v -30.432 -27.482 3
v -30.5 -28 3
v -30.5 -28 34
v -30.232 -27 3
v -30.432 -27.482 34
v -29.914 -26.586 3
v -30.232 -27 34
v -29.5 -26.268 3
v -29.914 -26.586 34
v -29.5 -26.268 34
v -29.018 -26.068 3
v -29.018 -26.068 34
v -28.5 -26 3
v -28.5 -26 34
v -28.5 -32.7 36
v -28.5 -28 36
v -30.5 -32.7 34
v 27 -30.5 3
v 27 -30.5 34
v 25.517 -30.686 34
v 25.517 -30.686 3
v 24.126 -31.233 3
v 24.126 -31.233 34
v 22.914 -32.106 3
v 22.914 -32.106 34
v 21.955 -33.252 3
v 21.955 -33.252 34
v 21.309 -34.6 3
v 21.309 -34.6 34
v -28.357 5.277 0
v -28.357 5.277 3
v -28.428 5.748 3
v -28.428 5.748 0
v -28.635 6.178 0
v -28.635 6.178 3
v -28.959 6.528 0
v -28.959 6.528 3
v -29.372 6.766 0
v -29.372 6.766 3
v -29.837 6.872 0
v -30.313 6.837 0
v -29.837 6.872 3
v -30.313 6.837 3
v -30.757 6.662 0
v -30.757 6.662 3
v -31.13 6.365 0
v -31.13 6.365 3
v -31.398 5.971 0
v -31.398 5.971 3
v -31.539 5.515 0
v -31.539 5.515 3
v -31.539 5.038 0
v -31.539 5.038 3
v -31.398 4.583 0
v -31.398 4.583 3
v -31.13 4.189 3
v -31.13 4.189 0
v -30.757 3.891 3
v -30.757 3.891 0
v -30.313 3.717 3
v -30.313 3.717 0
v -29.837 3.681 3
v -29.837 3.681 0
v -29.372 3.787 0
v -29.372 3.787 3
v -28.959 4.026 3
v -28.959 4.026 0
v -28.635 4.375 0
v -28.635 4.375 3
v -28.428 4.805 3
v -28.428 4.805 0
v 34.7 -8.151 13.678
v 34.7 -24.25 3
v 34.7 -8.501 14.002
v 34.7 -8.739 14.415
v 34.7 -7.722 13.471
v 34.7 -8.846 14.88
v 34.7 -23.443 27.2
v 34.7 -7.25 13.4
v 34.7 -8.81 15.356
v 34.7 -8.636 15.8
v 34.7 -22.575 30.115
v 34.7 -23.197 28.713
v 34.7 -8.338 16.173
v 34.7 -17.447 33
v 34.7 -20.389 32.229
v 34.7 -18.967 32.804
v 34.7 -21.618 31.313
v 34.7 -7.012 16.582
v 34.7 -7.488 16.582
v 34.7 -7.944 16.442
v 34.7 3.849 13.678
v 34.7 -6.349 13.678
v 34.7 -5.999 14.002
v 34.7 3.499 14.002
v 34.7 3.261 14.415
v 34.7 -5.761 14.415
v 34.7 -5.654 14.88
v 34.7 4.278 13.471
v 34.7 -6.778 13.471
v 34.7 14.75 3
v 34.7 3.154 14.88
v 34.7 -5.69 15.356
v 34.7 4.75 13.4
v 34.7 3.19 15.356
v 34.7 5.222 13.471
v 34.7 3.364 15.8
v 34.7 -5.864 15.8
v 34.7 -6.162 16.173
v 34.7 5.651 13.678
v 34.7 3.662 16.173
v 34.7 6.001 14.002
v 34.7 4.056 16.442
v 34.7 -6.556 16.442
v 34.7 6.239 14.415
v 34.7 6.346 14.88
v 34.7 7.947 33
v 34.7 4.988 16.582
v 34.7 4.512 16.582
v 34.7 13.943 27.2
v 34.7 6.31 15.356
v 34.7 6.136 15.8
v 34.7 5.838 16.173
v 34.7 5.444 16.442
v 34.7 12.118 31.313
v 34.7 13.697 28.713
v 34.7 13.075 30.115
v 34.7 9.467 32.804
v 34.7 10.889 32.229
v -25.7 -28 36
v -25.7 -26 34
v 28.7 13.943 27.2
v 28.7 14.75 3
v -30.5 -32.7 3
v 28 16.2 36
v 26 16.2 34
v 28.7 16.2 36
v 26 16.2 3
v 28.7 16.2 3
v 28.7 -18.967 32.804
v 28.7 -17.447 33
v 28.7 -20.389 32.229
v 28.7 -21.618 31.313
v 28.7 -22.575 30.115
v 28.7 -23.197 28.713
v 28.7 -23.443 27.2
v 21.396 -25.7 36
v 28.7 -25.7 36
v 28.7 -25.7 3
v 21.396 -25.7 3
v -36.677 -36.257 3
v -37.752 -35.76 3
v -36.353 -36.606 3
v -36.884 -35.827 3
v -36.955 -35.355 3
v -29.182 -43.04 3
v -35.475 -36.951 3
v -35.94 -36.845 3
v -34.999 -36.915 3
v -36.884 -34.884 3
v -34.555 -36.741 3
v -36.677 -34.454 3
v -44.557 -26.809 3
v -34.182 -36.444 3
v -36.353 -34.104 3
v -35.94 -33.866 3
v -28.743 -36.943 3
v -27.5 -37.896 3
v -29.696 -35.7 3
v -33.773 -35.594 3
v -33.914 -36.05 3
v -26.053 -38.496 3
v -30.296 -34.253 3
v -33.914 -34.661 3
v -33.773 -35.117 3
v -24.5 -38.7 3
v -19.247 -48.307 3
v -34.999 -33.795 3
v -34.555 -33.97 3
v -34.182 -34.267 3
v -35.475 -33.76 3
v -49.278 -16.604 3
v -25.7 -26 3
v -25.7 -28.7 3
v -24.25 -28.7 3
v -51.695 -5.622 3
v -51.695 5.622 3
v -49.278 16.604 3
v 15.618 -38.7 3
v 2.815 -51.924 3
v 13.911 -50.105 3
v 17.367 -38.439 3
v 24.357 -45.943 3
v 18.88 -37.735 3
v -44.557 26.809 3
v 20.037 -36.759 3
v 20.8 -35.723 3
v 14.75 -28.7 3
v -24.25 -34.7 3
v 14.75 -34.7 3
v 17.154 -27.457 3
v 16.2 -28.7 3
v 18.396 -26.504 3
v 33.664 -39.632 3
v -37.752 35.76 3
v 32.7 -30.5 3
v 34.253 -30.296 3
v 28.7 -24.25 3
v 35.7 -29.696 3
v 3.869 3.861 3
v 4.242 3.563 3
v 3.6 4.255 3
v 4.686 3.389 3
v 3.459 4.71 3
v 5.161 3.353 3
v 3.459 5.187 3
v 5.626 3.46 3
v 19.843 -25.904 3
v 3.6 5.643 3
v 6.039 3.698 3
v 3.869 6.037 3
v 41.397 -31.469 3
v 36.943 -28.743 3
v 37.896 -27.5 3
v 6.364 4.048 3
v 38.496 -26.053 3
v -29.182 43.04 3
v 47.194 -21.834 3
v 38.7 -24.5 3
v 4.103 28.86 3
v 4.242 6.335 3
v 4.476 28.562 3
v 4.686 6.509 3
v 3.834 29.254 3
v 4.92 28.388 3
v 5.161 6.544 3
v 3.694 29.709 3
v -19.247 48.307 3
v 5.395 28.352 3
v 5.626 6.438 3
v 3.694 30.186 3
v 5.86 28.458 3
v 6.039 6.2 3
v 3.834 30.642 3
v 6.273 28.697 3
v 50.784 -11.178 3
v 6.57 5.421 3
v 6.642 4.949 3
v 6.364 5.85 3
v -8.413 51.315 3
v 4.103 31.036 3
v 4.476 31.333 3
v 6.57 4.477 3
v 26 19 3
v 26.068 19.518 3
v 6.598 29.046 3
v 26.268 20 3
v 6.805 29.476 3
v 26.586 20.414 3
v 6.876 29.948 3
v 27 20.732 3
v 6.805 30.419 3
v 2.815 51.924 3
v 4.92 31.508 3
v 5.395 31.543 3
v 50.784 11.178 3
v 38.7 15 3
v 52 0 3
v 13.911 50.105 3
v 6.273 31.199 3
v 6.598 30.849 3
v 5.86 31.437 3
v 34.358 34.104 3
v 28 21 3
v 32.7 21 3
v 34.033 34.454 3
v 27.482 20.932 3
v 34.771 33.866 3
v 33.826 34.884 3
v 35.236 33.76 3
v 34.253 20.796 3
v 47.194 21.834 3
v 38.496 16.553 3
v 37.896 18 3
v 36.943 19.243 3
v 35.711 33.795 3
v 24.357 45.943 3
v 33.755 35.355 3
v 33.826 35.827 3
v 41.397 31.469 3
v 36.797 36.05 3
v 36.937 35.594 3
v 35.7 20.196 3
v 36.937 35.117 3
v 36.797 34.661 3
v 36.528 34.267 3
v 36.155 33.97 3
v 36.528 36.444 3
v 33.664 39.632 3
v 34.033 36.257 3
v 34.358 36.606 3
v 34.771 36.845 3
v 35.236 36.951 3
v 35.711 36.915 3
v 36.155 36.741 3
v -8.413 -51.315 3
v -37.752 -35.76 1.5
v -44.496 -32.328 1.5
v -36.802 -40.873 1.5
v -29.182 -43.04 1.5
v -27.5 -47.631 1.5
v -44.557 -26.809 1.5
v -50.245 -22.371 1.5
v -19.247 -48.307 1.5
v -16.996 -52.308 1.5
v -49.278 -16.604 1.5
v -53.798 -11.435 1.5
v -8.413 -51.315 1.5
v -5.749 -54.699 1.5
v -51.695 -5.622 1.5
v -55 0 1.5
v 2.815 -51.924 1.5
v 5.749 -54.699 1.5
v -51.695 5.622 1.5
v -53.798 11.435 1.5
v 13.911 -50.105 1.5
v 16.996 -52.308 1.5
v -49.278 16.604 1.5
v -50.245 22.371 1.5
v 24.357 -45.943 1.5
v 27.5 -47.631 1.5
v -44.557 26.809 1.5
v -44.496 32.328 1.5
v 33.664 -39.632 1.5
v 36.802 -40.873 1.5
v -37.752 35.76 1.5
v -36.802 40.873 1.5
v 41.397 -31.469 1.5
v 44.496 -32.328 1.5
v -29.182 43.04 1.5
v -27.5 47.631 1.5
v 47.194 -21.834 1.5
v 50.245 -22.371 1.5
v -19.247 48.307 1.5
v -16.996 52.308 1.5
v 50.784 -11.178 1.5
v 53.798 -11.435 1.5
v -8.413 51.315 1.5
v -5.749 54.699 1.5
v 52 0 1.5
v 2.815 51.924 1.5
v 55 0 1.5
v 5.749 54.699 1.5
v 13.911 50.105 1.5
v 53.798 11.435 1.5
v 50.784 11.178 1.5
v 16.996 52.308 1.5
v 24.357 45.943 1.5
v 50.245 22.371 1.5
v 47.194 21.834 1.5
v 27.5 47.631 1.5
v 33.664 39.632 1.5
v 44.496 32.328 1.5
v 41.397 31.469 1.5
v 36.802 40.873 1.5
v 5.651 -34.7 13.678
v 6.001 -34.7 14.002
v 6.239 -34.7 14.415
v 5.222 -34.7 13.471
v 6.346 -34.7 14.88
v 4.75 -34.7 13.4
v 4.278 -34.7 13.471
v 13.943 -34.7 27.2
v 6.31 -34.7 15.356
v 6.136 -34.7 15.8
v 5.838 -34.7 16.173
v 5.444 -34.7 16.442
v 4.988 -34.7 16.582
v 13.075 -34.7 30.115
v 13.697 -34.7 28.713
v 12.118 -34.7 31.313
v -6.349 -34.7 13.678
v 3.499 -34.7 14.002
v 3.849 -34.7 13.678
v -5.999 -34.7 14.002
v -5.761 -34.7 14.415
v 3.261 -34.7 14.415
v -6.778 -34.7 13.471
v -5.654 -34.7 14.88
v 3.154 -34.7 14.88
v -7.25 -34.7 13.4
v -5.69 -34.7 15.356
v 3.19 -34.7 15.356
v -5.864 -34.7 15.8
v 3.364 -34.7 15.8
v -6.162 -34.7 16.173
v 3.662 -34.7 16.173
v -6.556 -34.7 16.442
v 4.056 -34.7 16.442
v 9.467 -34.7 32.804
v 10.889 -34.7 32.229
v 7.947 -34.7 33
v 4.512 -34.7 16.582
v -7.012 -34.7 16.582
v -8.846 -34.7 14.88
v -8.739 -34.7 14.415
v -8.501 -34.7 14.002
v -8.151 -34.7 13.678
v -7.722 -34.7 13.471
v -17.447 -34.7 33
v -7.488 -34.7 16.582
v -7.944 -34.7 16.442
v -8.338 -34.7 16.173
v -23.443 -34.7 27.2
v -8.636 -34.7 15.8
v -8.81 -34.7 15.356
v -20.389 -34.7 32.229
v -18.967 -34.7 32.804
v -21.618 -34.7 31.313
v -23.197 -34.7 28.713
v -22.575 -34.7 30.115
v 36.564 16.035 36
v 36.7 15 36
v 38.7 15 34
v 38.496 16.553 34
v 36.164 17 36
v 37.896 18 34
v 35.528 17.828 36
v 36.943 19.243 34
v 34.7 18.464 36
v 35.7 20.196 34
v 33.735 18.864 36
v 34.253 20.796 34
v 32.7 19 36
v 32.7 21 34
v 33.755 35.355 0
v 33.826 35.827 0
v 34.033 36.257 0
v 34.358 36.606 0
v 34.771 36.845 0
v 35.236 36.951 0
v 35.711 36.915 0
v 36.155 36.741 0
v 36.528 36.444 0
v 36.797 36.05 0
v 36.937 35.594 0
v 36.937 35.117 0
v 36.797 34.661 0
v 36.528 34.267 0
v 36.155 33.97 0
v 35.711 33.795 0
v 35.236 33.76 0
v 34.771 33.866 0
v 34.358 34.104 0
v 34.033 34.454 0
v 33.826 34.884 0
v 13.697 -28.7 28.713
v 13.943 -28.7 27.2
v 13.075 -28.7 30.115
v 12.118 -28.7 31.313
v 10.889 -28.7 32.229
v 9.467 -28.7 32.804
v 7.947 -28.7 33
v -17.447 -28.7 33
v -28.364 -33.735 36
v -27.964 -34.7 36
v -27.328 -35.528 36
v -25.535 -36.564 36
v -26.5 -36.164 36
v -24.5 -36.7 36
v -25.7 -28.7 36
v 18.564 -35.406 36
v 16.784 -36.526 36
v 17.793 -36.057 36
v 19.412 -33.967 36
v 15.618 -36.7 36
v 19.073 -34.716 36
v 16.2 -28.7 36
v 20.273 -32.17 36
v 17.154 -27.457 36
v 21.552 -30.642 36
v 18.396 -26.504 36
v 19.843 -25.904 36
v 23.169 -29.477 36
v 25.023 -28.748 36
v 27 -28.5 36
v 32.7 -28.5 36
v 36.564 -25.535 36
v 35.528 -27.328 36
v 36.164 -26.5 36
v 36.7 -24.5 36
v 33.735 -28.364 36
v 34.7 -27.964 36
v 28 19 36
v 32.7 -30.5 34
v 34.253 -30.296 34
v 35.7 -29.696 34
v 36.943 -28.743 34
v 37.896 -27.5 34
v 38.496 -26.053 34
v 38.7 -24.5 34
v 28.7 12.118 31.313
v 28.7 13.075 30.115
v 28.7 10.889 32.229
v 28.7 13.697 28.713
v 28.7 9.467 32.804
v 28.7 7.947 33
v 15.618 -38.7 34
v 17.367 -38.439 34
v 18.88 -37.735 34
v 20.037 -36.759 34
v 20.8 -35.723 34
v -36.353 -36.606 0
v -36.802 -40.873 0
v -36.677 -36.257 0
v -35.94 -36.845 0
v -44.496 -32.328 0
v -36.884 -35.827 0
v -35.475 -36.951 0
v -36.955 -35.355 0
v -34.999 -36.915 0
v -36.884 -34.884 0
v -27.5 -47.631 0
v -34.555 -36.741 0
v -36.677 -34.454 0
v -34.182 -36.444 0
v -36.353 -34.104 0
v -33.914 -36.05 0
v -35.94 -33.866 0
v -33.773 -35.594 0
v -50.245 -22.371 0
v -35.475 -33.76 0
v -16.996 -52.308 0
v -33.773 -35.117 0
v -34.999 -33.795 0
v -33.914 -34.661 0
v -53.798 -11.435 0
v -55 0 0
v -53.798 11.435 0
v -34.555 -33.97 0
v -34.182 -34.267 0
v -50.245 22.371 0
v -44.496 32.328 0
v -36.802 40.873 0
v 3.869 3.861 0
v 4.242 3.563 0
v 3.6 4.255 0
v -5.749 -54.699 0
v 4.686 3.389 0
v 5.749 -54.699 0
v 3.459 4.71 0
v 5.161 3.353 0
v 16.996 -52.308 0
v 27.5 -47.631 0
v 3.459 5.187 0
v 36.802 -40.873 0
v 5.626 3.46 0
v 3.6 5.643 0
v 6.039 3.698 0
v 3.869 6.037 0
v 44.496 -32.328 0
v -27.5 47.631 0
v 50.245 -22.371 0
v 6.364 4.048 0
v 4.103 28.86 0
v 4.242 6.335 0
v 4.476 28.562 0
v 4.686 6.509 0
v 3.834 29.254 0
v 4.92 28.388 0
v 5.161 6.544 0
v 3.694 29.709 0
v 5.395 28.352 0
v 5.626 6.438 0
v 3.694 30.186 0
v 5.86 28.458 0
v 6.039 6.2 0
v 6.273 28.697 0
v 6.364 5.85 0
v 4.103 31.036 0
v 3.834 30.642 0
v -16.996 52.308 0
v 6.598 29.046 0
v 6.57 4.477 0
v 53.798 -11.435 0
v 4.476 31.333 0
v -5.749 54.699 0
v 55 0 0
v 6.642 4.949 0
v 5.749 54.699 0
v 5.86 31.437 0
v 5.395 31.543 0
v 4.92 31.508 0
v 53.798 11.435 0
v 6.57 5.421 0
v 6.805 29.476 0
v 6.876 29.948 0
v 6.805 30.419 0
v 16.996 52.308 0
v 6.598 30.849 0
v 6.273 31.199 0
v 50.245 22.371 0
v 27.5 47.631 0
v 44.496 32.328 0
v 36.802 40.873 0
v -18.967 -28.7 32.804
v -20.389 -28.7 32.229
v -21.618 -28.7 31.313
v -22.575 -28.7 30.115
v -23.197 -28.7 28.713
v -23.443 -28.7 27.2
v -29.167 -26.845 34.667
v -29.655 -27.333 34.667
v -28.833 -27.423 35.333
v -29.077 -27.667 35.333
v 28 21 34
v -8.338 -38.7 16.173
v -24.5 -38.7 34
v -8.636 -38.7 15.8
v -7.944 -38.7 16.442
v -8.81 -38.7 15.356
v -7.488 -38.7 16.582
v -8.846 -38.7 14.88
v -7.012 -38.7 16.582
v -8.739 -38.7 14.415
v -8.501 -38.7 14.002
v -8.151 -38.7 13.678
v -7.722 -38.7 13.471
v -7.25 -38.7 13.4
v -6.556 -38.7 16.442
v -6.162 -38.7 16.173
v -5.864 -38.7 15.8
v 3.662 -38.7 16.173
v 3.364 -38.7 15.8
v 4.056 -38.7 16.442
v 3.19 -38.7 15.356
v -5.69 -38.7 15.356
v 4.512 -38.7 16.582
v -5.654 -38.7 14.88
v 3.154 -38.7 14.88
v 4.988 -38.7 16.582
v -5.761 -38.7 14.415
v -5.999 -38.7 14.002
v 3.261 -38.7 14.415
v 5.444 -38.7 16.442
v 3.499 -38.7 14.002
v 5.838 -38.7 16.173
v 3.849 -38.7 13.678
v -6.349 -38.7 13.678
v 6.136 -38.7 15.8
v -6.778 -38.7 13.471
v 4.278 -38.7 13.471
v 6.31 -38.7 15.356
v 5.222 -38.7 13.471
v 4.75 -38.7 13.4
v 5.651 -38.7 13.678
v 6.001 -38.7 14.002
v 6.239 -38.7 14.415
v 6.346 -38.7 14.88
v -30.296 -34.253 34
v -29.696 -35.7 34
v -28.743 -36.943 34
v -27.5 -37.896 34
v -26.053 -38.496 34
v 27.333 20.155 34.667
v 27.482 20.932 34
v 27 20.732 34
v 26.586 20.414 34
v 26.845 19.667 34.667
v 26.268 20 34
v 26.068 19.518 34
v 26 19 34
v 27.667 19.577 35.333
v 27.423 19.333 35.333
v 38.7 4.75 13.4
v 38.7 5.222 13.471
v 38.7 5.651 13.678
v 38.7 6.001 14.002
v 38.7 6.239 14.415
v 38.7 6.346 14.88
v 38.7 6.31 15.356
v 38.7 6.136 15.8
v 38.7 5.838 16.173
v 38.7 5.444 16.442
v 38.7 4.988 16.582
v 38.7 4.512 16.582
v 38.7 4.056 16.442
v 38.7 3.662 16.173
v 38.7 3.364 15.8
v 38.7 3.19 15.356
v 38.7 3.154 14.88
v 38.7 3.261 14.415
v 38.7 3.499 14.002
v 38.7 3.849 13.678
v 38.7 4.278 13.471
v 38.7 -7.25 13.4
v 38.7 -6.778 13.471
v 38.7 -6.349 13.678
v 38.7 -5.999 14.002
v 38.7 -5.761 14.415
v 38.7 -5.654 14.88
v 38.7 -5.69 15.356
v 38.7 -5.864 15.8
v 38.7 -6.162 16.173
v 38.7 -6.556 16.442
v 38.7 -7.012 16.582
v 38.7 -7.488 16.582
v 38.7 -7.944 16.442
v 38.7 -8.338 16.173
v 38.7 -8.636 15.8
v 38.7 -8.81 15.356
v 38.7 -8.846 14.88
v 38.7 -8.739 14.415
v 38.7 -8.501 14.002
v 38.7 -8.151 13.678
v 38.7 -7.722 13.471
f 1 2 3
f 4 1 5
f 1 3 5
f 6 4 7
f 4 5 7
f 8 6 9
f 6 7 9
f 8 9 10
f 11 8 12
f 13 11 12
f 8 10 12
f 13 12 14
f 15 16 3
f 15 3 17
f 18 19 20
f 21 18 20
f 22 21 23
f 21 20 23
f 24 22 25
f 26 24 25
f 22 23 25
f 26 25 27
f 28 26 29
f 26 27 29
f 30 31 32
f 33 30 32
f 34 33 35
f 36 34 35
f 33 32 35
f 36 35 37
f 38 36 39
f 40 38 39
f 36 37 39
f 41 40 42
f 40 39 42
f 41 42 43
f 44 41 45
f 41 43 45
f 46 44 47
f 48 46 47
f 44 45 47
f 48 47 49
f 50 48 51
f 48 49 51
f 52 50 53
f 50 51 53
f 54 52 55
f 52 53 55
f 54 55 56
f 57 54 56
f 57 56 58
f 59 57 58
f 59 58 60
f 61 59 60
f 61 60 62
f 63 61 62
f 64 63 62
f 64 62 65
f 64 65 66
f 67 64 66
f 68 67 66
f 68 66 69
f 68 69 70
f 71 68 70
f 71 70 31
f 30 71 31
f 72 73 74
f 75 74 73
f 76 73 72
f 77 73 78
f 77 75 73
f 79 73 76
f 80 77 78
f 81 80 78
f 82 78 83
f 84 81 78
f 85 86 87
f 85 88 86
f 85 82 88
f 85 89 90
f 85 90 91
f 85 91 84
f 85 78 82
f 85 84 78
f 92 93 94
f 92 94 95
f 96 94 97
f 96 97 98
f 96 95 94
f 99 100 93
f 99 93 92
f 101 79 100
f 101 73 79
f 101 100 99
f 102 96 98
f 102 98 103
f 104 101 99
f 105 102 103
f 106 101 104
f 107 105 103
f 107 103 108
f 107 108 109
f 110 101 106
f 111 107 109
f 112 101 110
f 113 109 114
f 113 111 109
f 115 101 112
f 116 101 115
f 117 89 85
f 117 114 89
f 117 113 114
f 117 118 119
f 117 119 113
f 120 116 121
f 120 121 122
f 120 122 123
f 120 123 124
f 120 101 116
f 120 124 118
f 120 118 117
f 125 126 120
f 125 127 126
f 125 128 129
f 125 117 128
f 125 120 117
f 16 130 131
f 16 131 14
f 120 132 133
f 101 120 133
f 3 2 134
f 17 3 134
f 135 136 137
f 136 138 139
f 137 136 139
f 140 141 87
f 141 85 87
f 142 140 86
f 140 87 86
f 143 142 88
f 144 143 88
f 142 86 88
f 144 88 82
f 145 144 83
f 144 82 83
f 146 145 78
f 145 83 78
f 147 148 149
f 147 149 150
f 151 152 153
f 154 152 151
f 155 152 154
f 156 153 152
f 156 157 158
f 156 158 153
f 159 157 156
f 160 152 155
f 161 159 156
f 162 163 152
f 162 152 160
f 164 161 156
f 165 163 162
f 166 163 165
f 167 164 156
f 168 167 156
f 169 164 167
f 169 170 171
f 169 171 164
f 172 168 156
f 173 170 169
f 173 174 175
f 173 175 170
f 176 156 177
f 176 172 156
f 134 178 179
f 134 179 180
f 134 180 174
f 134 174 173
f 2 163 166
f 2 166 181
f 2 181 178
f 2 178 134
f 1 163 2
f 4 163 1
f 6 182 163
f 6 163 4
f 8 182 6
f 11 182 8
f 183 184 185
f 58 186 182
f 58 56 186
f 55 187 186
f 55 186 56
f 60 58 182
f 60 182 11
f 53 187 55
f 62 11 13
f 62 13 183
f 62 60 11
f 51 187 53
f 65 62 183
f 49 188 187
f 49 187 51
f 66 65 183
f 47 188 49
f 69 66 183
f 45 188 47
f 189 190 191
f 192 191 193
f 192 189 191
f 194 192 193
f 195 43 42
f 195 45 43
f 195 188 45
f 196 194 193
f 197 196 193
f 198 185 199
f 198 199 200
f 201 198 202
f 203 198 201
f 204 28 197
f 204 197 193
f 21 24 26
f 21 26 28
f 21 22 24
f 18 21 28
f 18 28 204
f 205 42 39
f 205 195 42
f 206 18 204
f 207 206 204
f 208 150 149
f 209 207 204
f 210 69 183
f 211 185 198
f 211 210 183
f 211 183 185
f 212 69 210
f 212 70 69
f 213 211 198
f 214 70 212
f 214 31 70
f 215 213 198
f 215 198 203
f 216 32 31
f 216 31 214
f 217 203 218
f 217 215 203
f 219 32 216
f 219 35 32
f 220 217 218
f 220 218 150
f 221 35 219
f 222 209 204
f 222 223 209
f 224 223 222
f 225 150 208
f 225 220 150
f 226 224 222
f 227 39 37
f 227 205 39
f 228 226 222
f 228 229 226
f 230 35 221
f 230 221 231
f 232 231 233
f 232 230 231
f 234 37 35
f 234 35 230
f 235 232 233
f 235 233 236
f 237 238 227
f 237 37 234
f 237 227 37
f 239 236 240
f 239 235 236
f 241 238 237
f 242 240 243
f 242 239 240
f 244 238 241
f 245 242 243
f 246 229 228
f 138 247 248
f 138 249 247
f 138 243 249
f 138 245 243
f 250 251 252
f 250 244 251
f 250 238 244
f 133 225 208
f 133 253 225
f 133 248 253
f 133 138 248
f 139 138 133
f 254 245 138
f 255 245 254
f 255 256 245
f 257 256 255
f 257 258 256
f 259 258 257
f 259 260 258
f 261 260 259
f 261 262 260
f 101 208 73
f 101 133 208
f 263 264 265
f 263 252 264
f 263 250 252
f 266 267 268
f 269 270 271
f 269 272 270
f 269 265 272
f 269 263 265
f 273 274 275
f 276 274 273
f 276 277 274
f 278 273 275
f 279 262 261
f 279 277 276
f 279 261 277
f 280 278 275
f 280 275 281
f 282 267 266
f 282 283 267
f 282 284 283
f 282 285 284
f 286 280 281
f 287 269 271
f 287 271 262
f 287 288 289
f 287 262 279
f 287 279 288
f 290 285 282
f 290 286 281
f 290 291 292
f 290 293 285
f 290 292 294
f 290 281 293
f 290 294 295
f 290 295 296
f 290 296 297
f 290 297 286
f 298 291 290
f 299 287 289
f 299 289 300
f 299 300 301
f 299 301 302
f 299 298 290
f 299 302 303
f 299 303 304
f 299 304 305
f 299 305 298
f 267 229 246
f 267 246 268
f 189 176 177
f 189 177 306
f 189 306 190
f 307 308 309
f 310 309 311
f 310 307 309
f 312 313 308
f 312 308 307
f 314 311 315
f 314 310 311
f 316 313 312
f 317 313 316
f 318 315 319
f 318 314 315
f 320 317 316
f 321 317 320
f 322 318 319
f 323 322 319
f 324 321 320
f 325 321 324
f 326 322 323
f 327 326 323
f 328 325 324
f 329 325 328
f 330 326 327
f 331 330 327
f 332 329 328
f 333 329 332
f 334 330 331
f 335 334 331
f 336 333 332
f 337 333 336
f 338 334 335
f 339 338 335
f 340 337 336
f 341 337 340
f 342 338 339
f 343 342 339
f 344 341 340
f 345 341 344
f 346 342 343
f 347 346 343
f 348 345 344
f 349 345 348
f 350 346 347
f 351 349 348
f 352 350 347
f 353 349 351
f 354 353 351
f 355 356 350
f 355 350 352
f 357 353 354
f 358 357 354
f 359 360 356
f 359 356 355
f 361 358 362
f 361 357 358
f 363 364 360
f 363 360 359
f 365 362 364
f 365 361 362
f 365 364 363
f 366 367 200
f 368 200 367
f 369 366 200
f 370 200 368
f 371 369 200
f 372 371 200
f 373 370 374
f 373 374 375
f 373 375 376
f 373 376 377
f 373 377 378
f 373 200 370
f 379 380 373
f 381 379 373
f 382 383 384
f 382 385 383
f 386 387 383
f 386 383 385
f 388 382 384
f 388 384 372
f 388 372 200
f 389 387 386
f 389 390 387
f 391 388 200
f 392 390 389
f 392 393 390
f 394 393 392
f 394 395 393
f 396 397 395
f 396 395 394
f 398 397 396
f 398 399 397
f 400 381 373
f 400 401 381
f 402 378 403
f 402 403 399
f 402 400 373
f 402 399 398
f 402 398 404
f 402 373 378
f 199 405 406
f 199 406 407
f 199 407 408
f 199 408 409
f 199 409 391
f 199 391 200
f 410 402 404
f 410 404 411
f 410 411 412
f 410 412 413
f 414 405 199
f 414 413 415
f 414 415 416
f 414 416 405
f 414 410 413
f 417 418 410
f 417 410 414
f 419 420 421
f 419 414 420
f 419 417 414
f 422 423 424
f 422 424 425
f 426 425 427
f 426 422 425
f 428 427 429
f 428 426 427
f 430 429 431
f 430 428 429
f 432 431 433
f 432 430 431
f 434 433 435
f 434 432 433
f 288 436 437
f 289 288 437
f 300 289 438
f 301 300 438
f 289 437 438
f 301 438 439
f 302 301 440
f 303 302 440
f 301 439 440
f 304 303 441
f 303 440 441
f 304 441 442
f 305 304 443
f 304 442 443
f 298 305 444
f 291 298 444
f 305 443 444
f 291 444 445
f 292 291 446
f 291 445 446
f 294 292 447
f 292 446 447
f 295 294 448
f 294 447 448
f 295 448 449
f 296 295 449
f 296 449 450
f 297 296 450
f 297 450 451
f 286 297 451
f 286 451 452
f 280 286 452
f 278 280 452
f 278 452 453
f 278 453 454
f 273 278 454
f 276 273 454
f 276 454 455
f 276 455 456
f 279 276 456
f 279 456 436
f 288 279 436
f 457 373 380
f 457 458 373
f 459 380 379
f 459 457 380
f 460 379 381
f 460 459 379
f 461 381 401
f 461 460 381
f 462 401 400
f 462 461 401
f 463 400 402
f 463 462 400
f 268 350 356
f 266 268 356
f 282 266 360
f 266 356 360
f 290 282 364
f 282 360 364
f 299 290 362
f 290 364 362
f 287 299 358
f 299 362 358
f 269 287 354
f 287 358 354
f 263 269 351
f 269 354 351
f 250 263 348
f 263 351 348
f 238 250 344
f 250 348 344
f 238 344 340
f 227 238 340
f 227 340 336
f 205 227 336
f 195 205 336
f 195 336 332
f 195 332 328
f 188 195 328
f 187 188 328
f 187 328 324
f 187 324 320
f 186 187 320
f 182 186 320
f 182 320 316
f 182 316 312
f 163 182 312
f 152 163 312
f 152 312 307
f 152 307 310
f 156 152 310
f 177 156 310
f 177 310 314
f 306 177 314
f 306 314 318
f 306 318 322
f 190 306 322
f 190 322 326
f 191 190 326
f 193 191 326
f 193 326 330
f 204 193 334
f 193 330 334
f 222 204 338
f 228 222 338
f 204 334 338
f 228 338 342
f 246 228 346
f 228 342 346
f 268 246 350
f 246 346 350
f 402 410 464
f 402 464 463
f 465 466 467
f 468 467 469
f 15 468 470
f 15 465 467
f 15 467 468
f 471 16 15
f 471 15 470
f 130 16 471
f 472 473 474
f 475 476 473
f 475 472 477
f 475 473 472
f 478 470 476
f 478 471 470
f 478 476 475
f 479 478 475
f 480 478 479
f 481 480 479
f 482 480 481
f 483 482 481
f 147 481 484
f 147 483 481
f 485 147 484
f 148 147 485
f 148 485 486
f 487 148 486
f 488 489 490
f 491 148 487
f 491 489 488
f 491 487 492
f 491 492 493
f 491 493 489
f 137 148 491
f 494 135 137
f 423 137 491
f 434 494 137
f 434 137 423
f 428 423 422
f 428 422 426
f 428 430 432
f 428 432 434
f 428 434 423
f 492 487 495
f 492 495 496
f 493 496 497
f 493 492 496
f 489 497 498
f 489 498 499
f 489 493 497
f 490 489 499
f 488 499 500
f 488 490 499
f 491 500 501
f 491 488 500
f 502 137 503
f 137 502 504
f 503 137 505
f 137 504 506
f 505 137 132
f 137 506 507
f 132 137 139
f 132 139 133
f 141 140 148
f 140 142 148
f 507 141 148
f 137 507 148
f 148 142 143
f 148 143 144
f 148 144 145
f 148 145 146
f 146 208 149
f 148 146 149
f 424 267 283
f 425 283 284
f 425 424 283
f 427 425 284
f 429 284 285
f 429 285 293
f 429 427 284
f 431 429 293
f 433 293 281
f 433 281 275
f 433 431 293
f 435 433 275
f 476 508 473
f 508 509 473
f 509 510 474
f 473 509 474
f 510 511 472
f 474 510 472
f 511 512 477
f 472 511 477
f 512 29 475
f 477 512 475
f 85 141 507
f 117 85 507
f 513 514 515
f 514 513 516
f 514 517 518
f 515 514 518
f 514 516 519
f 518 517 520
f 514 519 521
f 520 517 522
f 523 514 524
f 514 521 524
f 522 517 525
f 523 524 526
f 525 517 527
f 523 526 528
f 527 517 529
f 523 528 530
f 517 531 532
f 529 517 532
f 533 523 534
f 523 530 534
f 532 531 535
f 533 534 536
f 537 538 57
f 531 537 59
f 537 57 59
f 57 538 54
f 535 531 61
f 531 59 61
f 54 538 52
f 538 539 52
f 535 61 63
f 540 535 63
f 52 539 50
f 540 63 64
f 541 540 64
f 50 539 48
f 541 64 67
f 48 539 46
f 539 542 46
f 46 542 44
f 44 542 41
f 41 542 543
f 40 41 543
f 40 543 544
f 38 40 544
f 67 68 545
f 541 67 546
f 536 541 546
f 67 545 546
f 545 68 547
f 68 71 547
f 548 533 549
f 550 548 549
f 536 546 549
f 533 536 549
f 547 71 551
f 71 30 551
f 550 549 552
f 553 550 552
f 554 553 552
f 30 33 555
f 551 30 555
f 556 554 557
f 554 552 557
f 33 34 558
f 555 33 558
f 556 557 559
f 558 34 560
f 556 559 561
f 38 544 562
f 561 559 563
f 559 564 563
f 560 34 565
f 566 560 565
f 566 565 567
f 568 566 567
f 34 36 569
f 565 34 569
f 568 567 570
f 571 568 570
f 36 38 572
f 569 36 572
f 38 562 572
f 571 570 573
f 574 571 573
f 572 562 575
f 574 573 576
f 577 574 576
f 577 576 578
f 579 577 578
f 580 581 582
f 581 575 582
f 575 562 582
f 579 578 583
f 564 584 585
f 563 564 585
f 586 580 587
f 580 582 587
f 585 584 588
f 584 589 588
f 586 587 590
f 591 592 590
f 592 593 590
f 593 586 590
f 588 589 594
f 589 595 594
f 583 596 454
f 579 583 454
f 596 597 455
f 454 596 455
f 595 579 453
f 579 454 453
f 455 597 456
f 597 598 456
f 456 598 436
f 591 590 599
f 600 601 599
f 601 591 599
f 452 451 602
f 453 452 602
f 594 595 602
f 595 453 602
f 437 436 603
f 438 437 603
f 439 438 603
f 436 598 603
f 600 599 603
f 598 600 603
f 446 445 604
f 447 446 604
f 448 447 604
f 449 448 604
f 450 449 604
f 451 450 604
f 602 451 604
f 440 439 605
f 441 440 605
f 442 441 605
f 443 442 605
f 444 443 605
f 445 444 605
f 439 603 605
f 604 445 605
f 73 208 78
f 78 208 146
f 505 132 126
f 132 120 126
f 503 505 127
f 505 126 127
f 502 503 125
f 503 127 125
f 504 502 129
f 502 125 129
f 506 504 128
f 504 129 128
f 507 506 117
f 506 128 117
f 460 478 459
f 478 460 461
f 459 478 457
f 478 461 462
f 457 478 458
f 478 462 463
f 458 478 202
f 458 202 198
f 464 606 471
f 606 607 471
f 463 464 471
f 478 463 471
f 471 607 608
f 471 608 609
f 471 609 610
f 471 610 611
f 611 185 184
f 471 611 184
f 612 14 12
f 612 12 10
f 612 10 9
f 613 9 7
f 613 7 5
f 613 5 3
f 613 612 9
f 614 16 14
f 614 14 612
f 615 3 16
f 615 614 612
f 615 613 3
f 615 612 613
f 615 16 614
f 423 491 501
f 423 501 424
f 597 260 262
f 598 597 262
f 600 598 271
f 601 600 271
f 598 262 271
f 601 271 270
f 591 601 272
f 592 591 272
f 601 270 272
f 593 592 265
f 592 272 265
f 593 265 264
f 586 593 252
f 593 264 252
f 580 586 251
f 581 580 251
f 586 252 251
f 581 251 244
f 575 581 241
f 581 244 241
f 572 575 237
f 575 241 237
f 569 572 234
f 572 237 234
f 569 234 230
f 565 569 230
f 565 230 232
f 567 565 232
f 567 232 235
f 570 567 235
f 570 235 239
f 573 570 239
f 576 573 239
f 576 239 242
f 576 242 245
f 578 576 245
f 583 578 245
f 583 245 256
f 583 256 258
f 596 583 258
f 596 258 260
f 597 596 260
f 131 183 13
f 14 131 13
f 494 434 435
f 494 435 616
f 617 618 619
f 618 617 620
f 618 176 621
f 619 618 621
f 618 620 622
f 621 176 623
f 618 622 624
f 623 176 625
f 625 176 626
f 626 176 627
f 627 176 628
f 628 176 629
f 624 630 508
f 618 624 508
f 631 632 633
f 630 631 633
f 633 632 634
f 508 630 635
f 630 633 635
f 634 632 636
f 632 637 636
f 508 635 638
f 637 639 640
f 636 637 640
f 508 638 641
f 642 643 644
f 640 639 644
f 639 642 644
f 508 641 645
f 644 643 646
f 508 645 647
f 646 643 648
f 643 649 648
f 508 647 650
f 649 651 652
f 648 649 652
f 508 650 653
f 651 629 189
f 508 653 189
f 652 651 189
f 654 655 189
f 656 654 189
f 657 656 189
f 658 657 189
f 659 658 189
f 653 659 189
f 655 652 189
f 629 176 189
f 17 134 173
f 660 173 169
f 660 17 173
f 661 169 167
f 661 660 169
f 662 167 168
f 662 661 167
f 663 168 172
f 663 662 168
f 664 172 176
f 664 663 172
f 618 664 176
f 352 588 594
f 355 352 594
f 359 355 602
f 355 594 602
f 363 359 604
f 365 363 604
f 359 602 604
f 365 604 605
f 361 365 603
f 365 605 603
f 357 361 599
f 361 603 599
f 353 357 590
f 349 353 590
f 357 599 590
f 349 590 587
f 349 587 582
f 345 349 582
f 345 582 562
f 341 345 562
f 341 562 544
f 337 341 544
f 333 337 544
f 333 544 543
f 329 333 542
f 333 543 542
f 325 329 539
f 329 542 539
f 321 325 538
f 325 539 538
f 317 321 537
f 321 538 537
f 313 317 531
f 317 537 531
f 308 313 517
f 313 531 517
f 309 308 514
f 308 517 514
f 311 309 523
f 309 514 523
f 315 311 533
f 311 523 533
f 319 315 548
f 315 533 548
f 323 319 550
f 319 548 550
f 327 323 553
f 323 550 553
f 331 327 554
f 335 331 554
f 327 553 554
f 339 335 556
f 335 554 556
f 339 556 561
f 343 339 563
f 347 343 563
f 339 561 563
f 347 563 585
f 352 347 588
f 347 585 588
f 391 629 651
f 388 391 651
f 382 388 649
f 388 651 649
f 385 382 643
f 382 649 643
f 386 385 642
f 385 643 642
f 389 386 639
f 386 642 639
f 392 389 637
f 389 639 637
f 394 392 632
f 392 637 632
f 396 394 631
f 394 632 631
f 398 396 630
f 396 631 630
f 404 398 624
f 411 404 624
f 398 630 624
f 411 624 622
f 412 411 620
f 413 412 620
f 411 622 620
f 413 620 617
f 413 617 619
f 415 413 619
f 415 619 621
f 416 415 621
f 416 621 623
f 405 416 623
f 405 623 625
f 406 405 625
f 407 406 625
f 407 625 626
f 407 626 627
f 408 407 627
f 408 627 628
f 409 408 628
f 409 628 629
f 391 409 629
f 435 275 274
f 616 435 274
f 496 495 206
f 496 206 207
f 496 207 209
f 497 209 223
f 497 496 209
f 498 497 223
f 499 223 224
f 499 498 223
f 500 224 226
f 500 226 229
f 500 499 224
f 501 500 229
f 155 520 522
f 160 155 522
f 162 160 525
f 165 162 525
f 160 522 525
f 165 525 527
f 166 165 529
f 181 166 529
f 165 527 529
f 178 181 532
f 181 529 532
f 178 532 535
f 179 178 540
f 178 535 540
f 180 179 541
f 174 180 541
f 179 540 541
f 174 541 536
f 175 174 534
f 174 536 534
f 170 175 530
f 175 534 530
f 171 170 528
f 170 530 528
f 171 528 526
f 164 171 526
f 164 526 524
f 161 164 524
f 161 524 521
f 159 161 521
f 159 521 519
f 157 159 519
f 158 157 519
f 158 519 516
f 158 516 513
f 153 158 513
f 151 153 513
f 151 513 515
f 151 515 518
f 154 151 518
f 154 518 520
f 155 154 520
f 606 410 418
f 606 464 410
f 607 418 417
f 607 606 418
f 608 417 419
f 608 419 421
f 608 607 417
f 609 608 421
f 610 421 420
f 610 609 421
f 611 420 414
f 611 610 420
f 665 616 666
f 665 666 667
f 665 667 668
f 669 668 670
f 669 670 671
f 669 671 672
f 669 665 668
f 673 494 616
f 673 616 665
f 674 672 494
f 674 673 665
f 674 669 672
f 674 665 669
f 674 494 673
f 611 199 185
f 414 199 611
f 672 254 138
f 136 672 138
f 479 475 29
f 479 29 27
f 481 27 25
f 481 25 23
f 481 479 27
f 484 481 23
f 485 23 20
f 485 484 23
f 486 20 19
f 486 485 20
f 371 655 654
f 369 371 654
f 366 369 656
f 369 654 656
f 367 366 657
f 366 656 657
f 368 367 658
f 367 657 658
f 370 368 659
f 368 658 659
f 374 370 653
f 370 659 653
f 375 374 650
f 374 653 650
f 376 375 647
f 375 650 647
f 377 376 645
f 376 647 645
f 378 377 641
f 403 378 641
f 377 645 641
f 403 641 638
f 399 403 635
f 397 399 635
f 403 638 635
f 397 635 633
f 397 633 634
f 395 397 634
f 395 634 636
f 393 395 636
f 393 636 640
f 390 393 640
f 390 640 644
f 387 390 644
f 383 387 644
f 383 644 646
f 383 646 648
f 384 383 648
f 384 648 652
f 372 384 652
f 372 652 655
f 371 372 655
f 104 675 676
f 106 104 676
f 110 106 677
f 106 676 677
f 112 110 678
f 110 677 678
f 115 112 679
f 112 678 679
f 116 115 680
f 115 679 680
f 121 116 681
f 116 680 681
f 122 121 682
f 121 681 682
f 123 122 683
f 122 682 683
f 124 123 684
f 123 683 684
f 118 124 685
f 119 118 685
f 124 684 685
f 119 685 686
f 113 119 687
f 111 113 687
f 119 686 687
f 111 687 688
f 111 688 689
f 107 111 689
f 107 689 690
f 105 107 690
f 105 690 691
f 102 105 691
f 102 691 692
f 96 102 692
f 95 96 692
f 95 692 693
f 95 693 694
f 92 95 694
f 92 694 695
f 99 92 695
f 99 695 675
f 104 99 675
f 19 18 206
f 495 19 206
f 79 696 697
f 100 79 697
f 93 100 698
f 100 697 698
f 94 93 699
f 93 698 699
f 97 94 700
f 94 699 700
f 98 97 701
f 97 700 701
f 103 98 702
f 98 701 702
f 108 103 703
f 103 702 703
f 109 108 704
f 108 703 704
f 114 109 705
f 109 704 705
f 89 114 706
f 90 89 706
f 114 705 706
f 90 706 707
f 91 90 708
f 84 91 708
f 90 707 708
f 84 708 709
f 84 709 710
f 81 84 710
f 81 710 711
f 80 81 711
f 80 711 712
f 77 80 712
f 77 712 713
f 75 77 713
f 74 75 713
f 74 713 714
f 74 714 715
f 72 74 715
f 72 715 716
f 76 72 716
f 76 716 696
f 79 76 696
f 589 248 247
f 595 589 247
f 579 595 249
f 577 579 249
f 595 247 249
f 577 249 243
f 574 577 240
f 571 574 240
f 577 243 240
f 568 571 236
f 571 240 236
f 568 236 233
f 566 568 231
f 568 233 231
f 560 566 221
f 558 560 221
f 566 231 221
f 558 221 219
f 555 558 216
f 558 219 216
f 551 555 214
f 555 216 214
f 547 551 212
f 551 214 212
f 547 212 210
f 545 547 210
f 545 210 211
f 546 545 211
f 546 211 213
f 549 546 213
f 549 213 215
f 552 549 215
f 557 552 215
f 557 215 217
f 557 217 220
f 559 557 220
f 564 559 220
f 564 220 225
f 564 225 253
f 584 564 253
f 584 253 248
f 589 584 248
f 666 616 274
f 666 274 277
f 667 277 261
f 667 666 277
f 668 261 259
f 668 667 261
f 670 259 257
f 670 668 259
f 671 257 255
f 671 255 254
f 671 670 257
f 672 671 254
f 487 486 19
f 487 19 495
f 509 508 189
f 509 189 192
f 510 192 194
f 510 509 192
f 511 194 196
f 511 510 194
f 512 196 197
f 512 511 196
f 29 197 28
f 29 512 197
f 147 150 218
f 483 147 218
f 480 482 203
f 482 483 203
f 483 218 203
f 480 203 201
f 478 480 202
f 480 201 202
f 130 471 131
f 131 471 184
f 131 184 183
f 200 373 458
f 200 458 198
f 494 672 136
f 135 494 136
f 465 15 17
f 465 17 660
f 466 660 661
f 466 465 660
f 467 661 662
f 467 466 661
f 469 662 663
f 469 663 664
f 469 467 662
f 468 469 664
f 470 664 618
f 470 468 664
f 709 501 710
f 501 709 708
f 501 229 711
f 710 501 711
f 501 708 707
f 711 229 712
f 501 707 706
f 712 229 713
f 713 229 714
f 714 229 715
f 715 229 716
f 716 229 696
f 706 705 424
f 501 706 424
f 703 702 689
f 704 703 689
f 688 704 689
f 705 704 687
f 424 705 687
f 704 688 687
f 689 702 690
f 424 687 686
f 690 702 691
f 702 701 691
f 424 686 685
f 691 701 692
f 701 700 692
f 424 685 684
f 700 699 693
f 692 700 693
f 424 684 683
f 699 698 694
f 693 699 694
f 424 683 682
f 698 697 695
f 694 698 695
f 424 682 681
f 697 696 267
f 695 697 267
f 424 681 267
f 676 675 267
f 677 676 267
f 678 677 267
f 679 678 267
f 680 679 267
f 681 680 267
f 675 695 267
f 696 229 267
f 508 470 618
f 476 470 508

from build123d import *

# Parameters (mm, degrees)
SKIZZE1_R                        = 52
AUFSATZ_LINEAR_AUSTRAGEN1_DEPTH  = 3
SKIZZE1_3_R                      = 55
SKIZZE1_3_R_2                    = 52
AUFSATZ_LINEAR_AUSTRAGEN2_DEPTH  = 1.5
SCHNITT_LINEAR_AUSTRAGEN1_REACH  = 79.84
SKIZZE3_R                        = 1.6
AUFSATZ_LINEAR_AUSTRAGEN3_DEPTH  = 33
SCHNITT_LINEAR_AUSTRAGEN4_REACH  = 120.458
SCHNITT_LINEAR_START             = -4
VERRUNDUNG1_R                    = 6
SCHNITT_LINEAR_AUSTRAGEN9_DEPTH  = 6
VERRUNDUNG2_R                    = 6
VERRUNDUNG4_R                    = 6
VERRUNDUNG5_R                    = 6
VERRUNDUNG6_R                    = 2
SCHNITT_LINEAR_AUSTRAGEN10_REACH = 116.458
SKIZZE8_R                        = 1.6
SCHNITT_LINEAR_AUSTRAGEN11_REACH = 116.458
SKIZZE9_R                        = 1.6
VERRUNDUNG7_R                    = 6
SCHNITT_LINEAR_AUSTRAGEN13_REACH = 87.709
SKIZZE10_R                       = 1.6
FASE1_SIZE                       = 2


# Some blends are built 0.0001 mm under size
with BuildPart() as part:
    # Skizze1 → Aufsatz-Linear austragen1 (new body)
    with BuildSketch(Plane.XY):
        Circle(SKIZZE1_R)
    extrude(amount=AUFSATZ_LINEAR_AUSTRAGEN1_DEPTH)

    # Skizze1<3> → Aufsatz-Linear austragen2 (add)
    with BuildSketch(Plane.XY):
        Circle(SKIZZE1_3_R)
        Circle(SKIZZE1_3_R_2, mode=Mode.SUBTRACT)
    extrude(amount=AUFSATZ_LINEAR_AUSTRAGEN2_DEPTH)

    # Skizze3 → Schnitt-Linear austragen1 (cut, up to next)
    with BuildSketch(Plane.XY.offset(3), mode=Mode.PRIVATE) as schnitt_linear_austragen1_sk1:
        with Locations((5.041583425, 4.948905083)):
            Circle(SKIZZE3_R)
    schnitt_linear_austragen1_tool1 = extrude(schnitt_linear_austragen1_sk1.sketch, amount=-SCHNITT_LINEAR_AUSTRAGEN1_REACH, mode=Mode.PRIVATE) & part.part
    # Skizze3 → Schnitt-Linear austragen1 (cut, up to next)
    with BuildSketch(Plane.XY.offset(3), mode=Mode.PRIVATE) as schnitt_linear_austragen1_sk2:
        with Locations((5.275786867, 29.947808034)):
            Circle(SKIZZE3_R)
    schnitt_linear_austragen1_tool2 = extrude(schnitt_linear_austragen1_sk2.sketch, amount=-SCHNITT_LINEAR_AUSTRAGEN1_REACH, mode=Mode.PRIVATE) & part.part
    # Skizze3 → Schnitt-Linear austragen1 (cut, up to next)
    with BuildSketch(Plane.XY.offset(3), mode=Mode.PRIVATE) as schnitt_linear_austragen1_sk3:
        with Locations((-29.956880706, 5.276789902)):
            Circle(SKIZZE3_R)
    schnitt_linear_austragen1_tool3 = extrude(schnitt_linear_austragen1_sk3.sketch, amount=-SCHNITT_LINEAR_AUSTRAGEN1_REACH, mode=Mode.PRIVATE) & part.part
    add(schnitt_linear_austragen1_tool1.solids().sort_by_distance((5.041583, 4.948905, 3))[0], mode=Mode.SUBTRACT)
    add(schnitt_linear_austragen1_tool2.solids().sort_by_distance((5.275787, 29.947808, 3))[0], mode=Mode.SUBTRACT)
    add(schnitt_linear_austragen1_tool3.solids().sort_by_distance((-29.956881, 5.27679, 3))[0], mode=Mode.SUBTRACT)

    # Skizze2 → Aufsatz-Linear austragen3 (add)
    with BuildSketch(Plane.XY.offset(3)):
        Polygon((26, 21), (26, 16.2), (27.2, 16.2), (28.7, 16.2), (28.7, 15), (28.7, -24.5), (28.7, -25.7), (27.2, -25.7), (26, -25.7), (16.2, -25.7), (16.2, -26), (16.2, -27.2), (16.2, -28.7), (15, -28.7), (-24.5, -28.7), (-25.7, -28.7), (-25.7, -27.2), (-25.7, -26), (-30.5, -26), (-30.5, -33.3), (-30.5, -38.7), (-24.5, -38.7), (15, -38.7), (21, -38.7), (21, -33.3), (21, -30.5), (26, -30.5), (33.3, -30.5), (38.7, -30.5), (38.7, -24.5), (38.7, 15), (38.7, 21), (33.3, 21), align=None)
    extrude(amount=AUFSATZ_LINEAR_AUSTRAGEN3_DEPTH)

    # Skizze6 → Schnitt-Linear austragen4 (cut, up to next)
    with BuildSketch(Plane.XZ.offset(38.7).offset(SCHNITT_LINEAR_START), mode=Mode.PRIVATE) as schnitt_linear_austragen4_sk1:
        Polygon((-24.25, 3), (-23.25, 33), (13.75, 33), (14.75, 3), align=None)
    schnitt_linear_austragen4_tool1 = extrude(schnitt_linear_austragen4_sk1.sketch, amount=-SCHNITT_LINEAR_AUSTRAGEN4_REACH, mode=Mode.PRIVATE) & part.part
    add(schnitt_linear_austragen4_tool1.solids().sort_by_distance((-4.75, -34.7, 17.868421))[0], mode=Mode.SUBTRACT)

    # Verrundung1
    verrundung1_edges = [part.edges().sort_by_distance(p)[0] for p in [
        (-23.25, -31.7, 33),
        (13.75, -31.7, 33),
    ]]
    fillet(verrundung1_edges, radius=VERRUNDUNG1_R)

    # Skizze7 → Schnitt-Linear austragen9 (cut)
    with BuildSketch(Plane.ZY.offset(-28.7)):
        Polygon((33, -23.25), (33, 13.75), (3, 14.75), (3, -24.25), align=None)
    extrude(amount=-SCHNITT_LINEAR_AUSTRAGEN9_DEPTH, mode=Mode.SUBTRACT)

    # Verrundung2
    verrundung2_edges = [part.edges().sort_by_distance(p)[0] for p in [
        (31.7, -23.25, 33),
        (31.7, 13.75, 33),
    ]]
    fillet(verrundung2_edges, radius=VERRUNDUNG2_R)

    # Verrundung4
    verrundung4_edges = [part.edges().sort_by_distance(p)[0] for p in [
        (21, -30.5, 19.5),
    ]]
    fillet(verrundung4_edges, radius=VERRUNDUNG4_R)

    # Verrundung5
    # the kernel refuses this fillet: 6 mm, written as the material it takes off along each edge
    with BuildSketch(Plane(origin=(16.2, -25.7, 3), x_dir=(1, 0, 0), z_dir=(0, 0, 1))) as verrundung5_piece_1:
        with BuildLine():
            CenterArc((5.196152423, -6), VERRUNDUNG5_R, 90, 60)
            Line((0, -3), (0, 0))
            Line((0, 0), (5.196152423, 0))
        make_face()
    extrude(amount=45.990381057, mode=Mode.SUBTRACT)

    # Verrundung6
    verrundung6_edges = [part.edges().sort_by_distance(p)[0] for p in [
        (26, 21, 19.5),
        (-30.5, -26, 19.5),
    ]]
    fillet(verrundung6_edges, radius=VERRUNDUNG6_R)

    # Skizze8 → Schnitt-Linear austragen10 (cut, up to next)
    with BuildSketch(Plane.XZ.offset(38.7), mode=Mode.PRIVATE) as schnitt_linear_austragen10_sk1:
        with Locations(Location((4.75, 15, 0), (0, 0, 270))):
            Circle(SKIZZE8_R)
    schnitt_linear_austragen10_tool1 = extrude(schnitt_linear_austragen10_sk1.sketch, amount=-SCHNITT_LINEAR_AUSTRAGEN10_REACH, mode=Mode.PRIVATE) & part.part
    # Skizze8 → Schnitt-Linear austragen10 (cut, up to next)
    with BuildSketch(Plane.XZ.offset(38.7), mode=Mode.PRIVATE) as schnitt_linear_austragen10_sk2:
        with Locations(Location((-7.25, 15, 0), (0, 0, 270))):
            Circle(SKIZZE8_R)
    schnitt_linear_austragen10_tool2 = extrude(schnitt_linear_austragen10_sk2.sketch, amount=-SCHNITT_LINEAR_AUSTRAGEN10_REACH, mode=Mode.PRIVATE) & part.part
    add(schnitt_linear_austragen10_tool1.solids().sort_by_distance((4.75, -38.7, 15))[0], mode=Mode.SUBTRACT)
    add(schnitt_linear_austragen10_tool2.solids().sort_by_distance((-7.25, -38.7, 15))[0], mode=Mode.SUBTRACT)

    # Skizze9 → Schnitt-Linear austragen11 (cut, up to next)
    with BuildSketch(Plane(origin=(38.7, 0, 0), x_dir=(0, 0, -1), z_dir=(1, 0, 0)), mode=Mode.PRIVATE) as schnitt_linear_austragen11_sk1:
        with Locations((-15, -7.25)):
            Circle(SKIZZE9_R)
    schnitt_linear_austragen11_tool1 = extrude(schnitt_linear_austragen11_sk1.sketch, amount=-SCHNITT_LINEAR_AUSTRAGEN11_REACH, mode=Mode.PRIVATE) & part.part
    # Skizze9 → Schnitt-Linear austragen11 (cut, up to next)
    with BuildSketch(Plane(origin=(38.7, 0, 0), x_dir=(0, 0, -1), z_dir=(1, 0, 0)), mode=Mode.PRIVATE) as schnitt_linear_austragen11_sk2:
        with Locations((-15, 4.75)):
            Circle(SKIZZE9_R)
    schnitt_linear_austragen11_tool2 = extrude(schnitt_linear_austragen11_sk2.sketch, amount=-SCHNITT_LINEAR_AUSTRAGEN11_REACH, mode=Mode.PRIVATE) & part.part
    add(schnitt_linear_austragen11_tool1.solids().sort_by_distance((38.7, -7.25, 15))[0], mode=Mode.SUBTRACT)
    add(schnitt_linear_austragen11_tool2.solids().sort_by_distance((38.7, 4.75, 15))[0], mode=Mode.SUBTRACT)

    # Verrundung7
    verrundung7_edges = [part.edges().sort_by_distance(p)[0] for p in [
        (38.7, 21, 19.5),
        (-30.5, -38.7, 19.5),
        (21, -38.7, 19.5),
        (38.7, -30.5, 19.5),
    ]]
    fillet(verrundung7_edges, radius=VERRUNDUNG7_R)

    # Skizze10 → Schnitt-Linear austragen13 (cut, up to next)
    with BuildSketch(Plane(origin=(0, 0, 0), x_dir=(-1, 0, 0), z_dir=(0, 0, -1)), mode=Mode.PRIVATE) as schnitt_linear_austragen13_sk1:
        with Locations((35.355339059, -35.355339059)):
            Circle(SKIZZE10_R)
    schnitt_linear_austragen13_tool1 = extrude(schnitt_linear_austragen13_sk1.sketch, amount=-SCHNITT_LINEAR_AUSTRAGEN13_REACH, mode=Mode.PRIVATE) & part.part
    # Skizze10 → Schnitt-Linear austragen13 (cut, up to next)
    with BuildSketch(Plane(origin=(0, 0, 0), x_dir=(-1, 0, 0), z_dir=(0, 0, -1)), mode=Mode.PRIVATE) as schnitt_linear_austragen13_sk2:
        with Locations((-35.355339059, 35.355339059)):
            Circle(SKIZZE10_R)
    schnitt_linear_austragen13_tool2 = extrude(schnitt_linear_austragen13_sk2.sketch, amount=-SCHNITT_LINEAR_AUSTRAGEN13_REACH, mode=Mode.PRIVATE) & part.part
    add(schnitt_linear_austragen13_tool1.solids().sort_by_distance((-35.355339, -35.355339, 0))[0], mode=Mode.SUBTRACT)
    add(schnitt_linear_austragen13_tool2.solids().sort_by_distance((35.355339, 35.355339, 0))[0], mode=Mode.SUBTRACT)

    # Fase1
    fase1_edges = [part.edges().sort_by_distance(p)[0] for p in [
        (-30.5, -30.35, 36),
        (26, 17.6, 36),
        (26.585786438, 20.414213562, 36),
        (-29.914213562, -26.585786438, 36),
        (30.35, 21, 36),
        (38.7, -4.75, 36),
        (-4.44122131, -38.7, 36),
        (23.492864417, -31.631735422, 36),
        (29.85, -30.5, 36),
        (36.942640687, -28.742640687, 36),
        (19.124692969, -37.568264574, 36),
        (-28.742640687, -36.942640687, 36),
        (36.942640687, 19.242640687, 36),
        (-27.1, -26, 36),
    ]]
    chamfer(fase1_edges, length=FASE1_SIZE - 0.0001)  # a hair under: the kernel refuses the full size


solid = part.part
